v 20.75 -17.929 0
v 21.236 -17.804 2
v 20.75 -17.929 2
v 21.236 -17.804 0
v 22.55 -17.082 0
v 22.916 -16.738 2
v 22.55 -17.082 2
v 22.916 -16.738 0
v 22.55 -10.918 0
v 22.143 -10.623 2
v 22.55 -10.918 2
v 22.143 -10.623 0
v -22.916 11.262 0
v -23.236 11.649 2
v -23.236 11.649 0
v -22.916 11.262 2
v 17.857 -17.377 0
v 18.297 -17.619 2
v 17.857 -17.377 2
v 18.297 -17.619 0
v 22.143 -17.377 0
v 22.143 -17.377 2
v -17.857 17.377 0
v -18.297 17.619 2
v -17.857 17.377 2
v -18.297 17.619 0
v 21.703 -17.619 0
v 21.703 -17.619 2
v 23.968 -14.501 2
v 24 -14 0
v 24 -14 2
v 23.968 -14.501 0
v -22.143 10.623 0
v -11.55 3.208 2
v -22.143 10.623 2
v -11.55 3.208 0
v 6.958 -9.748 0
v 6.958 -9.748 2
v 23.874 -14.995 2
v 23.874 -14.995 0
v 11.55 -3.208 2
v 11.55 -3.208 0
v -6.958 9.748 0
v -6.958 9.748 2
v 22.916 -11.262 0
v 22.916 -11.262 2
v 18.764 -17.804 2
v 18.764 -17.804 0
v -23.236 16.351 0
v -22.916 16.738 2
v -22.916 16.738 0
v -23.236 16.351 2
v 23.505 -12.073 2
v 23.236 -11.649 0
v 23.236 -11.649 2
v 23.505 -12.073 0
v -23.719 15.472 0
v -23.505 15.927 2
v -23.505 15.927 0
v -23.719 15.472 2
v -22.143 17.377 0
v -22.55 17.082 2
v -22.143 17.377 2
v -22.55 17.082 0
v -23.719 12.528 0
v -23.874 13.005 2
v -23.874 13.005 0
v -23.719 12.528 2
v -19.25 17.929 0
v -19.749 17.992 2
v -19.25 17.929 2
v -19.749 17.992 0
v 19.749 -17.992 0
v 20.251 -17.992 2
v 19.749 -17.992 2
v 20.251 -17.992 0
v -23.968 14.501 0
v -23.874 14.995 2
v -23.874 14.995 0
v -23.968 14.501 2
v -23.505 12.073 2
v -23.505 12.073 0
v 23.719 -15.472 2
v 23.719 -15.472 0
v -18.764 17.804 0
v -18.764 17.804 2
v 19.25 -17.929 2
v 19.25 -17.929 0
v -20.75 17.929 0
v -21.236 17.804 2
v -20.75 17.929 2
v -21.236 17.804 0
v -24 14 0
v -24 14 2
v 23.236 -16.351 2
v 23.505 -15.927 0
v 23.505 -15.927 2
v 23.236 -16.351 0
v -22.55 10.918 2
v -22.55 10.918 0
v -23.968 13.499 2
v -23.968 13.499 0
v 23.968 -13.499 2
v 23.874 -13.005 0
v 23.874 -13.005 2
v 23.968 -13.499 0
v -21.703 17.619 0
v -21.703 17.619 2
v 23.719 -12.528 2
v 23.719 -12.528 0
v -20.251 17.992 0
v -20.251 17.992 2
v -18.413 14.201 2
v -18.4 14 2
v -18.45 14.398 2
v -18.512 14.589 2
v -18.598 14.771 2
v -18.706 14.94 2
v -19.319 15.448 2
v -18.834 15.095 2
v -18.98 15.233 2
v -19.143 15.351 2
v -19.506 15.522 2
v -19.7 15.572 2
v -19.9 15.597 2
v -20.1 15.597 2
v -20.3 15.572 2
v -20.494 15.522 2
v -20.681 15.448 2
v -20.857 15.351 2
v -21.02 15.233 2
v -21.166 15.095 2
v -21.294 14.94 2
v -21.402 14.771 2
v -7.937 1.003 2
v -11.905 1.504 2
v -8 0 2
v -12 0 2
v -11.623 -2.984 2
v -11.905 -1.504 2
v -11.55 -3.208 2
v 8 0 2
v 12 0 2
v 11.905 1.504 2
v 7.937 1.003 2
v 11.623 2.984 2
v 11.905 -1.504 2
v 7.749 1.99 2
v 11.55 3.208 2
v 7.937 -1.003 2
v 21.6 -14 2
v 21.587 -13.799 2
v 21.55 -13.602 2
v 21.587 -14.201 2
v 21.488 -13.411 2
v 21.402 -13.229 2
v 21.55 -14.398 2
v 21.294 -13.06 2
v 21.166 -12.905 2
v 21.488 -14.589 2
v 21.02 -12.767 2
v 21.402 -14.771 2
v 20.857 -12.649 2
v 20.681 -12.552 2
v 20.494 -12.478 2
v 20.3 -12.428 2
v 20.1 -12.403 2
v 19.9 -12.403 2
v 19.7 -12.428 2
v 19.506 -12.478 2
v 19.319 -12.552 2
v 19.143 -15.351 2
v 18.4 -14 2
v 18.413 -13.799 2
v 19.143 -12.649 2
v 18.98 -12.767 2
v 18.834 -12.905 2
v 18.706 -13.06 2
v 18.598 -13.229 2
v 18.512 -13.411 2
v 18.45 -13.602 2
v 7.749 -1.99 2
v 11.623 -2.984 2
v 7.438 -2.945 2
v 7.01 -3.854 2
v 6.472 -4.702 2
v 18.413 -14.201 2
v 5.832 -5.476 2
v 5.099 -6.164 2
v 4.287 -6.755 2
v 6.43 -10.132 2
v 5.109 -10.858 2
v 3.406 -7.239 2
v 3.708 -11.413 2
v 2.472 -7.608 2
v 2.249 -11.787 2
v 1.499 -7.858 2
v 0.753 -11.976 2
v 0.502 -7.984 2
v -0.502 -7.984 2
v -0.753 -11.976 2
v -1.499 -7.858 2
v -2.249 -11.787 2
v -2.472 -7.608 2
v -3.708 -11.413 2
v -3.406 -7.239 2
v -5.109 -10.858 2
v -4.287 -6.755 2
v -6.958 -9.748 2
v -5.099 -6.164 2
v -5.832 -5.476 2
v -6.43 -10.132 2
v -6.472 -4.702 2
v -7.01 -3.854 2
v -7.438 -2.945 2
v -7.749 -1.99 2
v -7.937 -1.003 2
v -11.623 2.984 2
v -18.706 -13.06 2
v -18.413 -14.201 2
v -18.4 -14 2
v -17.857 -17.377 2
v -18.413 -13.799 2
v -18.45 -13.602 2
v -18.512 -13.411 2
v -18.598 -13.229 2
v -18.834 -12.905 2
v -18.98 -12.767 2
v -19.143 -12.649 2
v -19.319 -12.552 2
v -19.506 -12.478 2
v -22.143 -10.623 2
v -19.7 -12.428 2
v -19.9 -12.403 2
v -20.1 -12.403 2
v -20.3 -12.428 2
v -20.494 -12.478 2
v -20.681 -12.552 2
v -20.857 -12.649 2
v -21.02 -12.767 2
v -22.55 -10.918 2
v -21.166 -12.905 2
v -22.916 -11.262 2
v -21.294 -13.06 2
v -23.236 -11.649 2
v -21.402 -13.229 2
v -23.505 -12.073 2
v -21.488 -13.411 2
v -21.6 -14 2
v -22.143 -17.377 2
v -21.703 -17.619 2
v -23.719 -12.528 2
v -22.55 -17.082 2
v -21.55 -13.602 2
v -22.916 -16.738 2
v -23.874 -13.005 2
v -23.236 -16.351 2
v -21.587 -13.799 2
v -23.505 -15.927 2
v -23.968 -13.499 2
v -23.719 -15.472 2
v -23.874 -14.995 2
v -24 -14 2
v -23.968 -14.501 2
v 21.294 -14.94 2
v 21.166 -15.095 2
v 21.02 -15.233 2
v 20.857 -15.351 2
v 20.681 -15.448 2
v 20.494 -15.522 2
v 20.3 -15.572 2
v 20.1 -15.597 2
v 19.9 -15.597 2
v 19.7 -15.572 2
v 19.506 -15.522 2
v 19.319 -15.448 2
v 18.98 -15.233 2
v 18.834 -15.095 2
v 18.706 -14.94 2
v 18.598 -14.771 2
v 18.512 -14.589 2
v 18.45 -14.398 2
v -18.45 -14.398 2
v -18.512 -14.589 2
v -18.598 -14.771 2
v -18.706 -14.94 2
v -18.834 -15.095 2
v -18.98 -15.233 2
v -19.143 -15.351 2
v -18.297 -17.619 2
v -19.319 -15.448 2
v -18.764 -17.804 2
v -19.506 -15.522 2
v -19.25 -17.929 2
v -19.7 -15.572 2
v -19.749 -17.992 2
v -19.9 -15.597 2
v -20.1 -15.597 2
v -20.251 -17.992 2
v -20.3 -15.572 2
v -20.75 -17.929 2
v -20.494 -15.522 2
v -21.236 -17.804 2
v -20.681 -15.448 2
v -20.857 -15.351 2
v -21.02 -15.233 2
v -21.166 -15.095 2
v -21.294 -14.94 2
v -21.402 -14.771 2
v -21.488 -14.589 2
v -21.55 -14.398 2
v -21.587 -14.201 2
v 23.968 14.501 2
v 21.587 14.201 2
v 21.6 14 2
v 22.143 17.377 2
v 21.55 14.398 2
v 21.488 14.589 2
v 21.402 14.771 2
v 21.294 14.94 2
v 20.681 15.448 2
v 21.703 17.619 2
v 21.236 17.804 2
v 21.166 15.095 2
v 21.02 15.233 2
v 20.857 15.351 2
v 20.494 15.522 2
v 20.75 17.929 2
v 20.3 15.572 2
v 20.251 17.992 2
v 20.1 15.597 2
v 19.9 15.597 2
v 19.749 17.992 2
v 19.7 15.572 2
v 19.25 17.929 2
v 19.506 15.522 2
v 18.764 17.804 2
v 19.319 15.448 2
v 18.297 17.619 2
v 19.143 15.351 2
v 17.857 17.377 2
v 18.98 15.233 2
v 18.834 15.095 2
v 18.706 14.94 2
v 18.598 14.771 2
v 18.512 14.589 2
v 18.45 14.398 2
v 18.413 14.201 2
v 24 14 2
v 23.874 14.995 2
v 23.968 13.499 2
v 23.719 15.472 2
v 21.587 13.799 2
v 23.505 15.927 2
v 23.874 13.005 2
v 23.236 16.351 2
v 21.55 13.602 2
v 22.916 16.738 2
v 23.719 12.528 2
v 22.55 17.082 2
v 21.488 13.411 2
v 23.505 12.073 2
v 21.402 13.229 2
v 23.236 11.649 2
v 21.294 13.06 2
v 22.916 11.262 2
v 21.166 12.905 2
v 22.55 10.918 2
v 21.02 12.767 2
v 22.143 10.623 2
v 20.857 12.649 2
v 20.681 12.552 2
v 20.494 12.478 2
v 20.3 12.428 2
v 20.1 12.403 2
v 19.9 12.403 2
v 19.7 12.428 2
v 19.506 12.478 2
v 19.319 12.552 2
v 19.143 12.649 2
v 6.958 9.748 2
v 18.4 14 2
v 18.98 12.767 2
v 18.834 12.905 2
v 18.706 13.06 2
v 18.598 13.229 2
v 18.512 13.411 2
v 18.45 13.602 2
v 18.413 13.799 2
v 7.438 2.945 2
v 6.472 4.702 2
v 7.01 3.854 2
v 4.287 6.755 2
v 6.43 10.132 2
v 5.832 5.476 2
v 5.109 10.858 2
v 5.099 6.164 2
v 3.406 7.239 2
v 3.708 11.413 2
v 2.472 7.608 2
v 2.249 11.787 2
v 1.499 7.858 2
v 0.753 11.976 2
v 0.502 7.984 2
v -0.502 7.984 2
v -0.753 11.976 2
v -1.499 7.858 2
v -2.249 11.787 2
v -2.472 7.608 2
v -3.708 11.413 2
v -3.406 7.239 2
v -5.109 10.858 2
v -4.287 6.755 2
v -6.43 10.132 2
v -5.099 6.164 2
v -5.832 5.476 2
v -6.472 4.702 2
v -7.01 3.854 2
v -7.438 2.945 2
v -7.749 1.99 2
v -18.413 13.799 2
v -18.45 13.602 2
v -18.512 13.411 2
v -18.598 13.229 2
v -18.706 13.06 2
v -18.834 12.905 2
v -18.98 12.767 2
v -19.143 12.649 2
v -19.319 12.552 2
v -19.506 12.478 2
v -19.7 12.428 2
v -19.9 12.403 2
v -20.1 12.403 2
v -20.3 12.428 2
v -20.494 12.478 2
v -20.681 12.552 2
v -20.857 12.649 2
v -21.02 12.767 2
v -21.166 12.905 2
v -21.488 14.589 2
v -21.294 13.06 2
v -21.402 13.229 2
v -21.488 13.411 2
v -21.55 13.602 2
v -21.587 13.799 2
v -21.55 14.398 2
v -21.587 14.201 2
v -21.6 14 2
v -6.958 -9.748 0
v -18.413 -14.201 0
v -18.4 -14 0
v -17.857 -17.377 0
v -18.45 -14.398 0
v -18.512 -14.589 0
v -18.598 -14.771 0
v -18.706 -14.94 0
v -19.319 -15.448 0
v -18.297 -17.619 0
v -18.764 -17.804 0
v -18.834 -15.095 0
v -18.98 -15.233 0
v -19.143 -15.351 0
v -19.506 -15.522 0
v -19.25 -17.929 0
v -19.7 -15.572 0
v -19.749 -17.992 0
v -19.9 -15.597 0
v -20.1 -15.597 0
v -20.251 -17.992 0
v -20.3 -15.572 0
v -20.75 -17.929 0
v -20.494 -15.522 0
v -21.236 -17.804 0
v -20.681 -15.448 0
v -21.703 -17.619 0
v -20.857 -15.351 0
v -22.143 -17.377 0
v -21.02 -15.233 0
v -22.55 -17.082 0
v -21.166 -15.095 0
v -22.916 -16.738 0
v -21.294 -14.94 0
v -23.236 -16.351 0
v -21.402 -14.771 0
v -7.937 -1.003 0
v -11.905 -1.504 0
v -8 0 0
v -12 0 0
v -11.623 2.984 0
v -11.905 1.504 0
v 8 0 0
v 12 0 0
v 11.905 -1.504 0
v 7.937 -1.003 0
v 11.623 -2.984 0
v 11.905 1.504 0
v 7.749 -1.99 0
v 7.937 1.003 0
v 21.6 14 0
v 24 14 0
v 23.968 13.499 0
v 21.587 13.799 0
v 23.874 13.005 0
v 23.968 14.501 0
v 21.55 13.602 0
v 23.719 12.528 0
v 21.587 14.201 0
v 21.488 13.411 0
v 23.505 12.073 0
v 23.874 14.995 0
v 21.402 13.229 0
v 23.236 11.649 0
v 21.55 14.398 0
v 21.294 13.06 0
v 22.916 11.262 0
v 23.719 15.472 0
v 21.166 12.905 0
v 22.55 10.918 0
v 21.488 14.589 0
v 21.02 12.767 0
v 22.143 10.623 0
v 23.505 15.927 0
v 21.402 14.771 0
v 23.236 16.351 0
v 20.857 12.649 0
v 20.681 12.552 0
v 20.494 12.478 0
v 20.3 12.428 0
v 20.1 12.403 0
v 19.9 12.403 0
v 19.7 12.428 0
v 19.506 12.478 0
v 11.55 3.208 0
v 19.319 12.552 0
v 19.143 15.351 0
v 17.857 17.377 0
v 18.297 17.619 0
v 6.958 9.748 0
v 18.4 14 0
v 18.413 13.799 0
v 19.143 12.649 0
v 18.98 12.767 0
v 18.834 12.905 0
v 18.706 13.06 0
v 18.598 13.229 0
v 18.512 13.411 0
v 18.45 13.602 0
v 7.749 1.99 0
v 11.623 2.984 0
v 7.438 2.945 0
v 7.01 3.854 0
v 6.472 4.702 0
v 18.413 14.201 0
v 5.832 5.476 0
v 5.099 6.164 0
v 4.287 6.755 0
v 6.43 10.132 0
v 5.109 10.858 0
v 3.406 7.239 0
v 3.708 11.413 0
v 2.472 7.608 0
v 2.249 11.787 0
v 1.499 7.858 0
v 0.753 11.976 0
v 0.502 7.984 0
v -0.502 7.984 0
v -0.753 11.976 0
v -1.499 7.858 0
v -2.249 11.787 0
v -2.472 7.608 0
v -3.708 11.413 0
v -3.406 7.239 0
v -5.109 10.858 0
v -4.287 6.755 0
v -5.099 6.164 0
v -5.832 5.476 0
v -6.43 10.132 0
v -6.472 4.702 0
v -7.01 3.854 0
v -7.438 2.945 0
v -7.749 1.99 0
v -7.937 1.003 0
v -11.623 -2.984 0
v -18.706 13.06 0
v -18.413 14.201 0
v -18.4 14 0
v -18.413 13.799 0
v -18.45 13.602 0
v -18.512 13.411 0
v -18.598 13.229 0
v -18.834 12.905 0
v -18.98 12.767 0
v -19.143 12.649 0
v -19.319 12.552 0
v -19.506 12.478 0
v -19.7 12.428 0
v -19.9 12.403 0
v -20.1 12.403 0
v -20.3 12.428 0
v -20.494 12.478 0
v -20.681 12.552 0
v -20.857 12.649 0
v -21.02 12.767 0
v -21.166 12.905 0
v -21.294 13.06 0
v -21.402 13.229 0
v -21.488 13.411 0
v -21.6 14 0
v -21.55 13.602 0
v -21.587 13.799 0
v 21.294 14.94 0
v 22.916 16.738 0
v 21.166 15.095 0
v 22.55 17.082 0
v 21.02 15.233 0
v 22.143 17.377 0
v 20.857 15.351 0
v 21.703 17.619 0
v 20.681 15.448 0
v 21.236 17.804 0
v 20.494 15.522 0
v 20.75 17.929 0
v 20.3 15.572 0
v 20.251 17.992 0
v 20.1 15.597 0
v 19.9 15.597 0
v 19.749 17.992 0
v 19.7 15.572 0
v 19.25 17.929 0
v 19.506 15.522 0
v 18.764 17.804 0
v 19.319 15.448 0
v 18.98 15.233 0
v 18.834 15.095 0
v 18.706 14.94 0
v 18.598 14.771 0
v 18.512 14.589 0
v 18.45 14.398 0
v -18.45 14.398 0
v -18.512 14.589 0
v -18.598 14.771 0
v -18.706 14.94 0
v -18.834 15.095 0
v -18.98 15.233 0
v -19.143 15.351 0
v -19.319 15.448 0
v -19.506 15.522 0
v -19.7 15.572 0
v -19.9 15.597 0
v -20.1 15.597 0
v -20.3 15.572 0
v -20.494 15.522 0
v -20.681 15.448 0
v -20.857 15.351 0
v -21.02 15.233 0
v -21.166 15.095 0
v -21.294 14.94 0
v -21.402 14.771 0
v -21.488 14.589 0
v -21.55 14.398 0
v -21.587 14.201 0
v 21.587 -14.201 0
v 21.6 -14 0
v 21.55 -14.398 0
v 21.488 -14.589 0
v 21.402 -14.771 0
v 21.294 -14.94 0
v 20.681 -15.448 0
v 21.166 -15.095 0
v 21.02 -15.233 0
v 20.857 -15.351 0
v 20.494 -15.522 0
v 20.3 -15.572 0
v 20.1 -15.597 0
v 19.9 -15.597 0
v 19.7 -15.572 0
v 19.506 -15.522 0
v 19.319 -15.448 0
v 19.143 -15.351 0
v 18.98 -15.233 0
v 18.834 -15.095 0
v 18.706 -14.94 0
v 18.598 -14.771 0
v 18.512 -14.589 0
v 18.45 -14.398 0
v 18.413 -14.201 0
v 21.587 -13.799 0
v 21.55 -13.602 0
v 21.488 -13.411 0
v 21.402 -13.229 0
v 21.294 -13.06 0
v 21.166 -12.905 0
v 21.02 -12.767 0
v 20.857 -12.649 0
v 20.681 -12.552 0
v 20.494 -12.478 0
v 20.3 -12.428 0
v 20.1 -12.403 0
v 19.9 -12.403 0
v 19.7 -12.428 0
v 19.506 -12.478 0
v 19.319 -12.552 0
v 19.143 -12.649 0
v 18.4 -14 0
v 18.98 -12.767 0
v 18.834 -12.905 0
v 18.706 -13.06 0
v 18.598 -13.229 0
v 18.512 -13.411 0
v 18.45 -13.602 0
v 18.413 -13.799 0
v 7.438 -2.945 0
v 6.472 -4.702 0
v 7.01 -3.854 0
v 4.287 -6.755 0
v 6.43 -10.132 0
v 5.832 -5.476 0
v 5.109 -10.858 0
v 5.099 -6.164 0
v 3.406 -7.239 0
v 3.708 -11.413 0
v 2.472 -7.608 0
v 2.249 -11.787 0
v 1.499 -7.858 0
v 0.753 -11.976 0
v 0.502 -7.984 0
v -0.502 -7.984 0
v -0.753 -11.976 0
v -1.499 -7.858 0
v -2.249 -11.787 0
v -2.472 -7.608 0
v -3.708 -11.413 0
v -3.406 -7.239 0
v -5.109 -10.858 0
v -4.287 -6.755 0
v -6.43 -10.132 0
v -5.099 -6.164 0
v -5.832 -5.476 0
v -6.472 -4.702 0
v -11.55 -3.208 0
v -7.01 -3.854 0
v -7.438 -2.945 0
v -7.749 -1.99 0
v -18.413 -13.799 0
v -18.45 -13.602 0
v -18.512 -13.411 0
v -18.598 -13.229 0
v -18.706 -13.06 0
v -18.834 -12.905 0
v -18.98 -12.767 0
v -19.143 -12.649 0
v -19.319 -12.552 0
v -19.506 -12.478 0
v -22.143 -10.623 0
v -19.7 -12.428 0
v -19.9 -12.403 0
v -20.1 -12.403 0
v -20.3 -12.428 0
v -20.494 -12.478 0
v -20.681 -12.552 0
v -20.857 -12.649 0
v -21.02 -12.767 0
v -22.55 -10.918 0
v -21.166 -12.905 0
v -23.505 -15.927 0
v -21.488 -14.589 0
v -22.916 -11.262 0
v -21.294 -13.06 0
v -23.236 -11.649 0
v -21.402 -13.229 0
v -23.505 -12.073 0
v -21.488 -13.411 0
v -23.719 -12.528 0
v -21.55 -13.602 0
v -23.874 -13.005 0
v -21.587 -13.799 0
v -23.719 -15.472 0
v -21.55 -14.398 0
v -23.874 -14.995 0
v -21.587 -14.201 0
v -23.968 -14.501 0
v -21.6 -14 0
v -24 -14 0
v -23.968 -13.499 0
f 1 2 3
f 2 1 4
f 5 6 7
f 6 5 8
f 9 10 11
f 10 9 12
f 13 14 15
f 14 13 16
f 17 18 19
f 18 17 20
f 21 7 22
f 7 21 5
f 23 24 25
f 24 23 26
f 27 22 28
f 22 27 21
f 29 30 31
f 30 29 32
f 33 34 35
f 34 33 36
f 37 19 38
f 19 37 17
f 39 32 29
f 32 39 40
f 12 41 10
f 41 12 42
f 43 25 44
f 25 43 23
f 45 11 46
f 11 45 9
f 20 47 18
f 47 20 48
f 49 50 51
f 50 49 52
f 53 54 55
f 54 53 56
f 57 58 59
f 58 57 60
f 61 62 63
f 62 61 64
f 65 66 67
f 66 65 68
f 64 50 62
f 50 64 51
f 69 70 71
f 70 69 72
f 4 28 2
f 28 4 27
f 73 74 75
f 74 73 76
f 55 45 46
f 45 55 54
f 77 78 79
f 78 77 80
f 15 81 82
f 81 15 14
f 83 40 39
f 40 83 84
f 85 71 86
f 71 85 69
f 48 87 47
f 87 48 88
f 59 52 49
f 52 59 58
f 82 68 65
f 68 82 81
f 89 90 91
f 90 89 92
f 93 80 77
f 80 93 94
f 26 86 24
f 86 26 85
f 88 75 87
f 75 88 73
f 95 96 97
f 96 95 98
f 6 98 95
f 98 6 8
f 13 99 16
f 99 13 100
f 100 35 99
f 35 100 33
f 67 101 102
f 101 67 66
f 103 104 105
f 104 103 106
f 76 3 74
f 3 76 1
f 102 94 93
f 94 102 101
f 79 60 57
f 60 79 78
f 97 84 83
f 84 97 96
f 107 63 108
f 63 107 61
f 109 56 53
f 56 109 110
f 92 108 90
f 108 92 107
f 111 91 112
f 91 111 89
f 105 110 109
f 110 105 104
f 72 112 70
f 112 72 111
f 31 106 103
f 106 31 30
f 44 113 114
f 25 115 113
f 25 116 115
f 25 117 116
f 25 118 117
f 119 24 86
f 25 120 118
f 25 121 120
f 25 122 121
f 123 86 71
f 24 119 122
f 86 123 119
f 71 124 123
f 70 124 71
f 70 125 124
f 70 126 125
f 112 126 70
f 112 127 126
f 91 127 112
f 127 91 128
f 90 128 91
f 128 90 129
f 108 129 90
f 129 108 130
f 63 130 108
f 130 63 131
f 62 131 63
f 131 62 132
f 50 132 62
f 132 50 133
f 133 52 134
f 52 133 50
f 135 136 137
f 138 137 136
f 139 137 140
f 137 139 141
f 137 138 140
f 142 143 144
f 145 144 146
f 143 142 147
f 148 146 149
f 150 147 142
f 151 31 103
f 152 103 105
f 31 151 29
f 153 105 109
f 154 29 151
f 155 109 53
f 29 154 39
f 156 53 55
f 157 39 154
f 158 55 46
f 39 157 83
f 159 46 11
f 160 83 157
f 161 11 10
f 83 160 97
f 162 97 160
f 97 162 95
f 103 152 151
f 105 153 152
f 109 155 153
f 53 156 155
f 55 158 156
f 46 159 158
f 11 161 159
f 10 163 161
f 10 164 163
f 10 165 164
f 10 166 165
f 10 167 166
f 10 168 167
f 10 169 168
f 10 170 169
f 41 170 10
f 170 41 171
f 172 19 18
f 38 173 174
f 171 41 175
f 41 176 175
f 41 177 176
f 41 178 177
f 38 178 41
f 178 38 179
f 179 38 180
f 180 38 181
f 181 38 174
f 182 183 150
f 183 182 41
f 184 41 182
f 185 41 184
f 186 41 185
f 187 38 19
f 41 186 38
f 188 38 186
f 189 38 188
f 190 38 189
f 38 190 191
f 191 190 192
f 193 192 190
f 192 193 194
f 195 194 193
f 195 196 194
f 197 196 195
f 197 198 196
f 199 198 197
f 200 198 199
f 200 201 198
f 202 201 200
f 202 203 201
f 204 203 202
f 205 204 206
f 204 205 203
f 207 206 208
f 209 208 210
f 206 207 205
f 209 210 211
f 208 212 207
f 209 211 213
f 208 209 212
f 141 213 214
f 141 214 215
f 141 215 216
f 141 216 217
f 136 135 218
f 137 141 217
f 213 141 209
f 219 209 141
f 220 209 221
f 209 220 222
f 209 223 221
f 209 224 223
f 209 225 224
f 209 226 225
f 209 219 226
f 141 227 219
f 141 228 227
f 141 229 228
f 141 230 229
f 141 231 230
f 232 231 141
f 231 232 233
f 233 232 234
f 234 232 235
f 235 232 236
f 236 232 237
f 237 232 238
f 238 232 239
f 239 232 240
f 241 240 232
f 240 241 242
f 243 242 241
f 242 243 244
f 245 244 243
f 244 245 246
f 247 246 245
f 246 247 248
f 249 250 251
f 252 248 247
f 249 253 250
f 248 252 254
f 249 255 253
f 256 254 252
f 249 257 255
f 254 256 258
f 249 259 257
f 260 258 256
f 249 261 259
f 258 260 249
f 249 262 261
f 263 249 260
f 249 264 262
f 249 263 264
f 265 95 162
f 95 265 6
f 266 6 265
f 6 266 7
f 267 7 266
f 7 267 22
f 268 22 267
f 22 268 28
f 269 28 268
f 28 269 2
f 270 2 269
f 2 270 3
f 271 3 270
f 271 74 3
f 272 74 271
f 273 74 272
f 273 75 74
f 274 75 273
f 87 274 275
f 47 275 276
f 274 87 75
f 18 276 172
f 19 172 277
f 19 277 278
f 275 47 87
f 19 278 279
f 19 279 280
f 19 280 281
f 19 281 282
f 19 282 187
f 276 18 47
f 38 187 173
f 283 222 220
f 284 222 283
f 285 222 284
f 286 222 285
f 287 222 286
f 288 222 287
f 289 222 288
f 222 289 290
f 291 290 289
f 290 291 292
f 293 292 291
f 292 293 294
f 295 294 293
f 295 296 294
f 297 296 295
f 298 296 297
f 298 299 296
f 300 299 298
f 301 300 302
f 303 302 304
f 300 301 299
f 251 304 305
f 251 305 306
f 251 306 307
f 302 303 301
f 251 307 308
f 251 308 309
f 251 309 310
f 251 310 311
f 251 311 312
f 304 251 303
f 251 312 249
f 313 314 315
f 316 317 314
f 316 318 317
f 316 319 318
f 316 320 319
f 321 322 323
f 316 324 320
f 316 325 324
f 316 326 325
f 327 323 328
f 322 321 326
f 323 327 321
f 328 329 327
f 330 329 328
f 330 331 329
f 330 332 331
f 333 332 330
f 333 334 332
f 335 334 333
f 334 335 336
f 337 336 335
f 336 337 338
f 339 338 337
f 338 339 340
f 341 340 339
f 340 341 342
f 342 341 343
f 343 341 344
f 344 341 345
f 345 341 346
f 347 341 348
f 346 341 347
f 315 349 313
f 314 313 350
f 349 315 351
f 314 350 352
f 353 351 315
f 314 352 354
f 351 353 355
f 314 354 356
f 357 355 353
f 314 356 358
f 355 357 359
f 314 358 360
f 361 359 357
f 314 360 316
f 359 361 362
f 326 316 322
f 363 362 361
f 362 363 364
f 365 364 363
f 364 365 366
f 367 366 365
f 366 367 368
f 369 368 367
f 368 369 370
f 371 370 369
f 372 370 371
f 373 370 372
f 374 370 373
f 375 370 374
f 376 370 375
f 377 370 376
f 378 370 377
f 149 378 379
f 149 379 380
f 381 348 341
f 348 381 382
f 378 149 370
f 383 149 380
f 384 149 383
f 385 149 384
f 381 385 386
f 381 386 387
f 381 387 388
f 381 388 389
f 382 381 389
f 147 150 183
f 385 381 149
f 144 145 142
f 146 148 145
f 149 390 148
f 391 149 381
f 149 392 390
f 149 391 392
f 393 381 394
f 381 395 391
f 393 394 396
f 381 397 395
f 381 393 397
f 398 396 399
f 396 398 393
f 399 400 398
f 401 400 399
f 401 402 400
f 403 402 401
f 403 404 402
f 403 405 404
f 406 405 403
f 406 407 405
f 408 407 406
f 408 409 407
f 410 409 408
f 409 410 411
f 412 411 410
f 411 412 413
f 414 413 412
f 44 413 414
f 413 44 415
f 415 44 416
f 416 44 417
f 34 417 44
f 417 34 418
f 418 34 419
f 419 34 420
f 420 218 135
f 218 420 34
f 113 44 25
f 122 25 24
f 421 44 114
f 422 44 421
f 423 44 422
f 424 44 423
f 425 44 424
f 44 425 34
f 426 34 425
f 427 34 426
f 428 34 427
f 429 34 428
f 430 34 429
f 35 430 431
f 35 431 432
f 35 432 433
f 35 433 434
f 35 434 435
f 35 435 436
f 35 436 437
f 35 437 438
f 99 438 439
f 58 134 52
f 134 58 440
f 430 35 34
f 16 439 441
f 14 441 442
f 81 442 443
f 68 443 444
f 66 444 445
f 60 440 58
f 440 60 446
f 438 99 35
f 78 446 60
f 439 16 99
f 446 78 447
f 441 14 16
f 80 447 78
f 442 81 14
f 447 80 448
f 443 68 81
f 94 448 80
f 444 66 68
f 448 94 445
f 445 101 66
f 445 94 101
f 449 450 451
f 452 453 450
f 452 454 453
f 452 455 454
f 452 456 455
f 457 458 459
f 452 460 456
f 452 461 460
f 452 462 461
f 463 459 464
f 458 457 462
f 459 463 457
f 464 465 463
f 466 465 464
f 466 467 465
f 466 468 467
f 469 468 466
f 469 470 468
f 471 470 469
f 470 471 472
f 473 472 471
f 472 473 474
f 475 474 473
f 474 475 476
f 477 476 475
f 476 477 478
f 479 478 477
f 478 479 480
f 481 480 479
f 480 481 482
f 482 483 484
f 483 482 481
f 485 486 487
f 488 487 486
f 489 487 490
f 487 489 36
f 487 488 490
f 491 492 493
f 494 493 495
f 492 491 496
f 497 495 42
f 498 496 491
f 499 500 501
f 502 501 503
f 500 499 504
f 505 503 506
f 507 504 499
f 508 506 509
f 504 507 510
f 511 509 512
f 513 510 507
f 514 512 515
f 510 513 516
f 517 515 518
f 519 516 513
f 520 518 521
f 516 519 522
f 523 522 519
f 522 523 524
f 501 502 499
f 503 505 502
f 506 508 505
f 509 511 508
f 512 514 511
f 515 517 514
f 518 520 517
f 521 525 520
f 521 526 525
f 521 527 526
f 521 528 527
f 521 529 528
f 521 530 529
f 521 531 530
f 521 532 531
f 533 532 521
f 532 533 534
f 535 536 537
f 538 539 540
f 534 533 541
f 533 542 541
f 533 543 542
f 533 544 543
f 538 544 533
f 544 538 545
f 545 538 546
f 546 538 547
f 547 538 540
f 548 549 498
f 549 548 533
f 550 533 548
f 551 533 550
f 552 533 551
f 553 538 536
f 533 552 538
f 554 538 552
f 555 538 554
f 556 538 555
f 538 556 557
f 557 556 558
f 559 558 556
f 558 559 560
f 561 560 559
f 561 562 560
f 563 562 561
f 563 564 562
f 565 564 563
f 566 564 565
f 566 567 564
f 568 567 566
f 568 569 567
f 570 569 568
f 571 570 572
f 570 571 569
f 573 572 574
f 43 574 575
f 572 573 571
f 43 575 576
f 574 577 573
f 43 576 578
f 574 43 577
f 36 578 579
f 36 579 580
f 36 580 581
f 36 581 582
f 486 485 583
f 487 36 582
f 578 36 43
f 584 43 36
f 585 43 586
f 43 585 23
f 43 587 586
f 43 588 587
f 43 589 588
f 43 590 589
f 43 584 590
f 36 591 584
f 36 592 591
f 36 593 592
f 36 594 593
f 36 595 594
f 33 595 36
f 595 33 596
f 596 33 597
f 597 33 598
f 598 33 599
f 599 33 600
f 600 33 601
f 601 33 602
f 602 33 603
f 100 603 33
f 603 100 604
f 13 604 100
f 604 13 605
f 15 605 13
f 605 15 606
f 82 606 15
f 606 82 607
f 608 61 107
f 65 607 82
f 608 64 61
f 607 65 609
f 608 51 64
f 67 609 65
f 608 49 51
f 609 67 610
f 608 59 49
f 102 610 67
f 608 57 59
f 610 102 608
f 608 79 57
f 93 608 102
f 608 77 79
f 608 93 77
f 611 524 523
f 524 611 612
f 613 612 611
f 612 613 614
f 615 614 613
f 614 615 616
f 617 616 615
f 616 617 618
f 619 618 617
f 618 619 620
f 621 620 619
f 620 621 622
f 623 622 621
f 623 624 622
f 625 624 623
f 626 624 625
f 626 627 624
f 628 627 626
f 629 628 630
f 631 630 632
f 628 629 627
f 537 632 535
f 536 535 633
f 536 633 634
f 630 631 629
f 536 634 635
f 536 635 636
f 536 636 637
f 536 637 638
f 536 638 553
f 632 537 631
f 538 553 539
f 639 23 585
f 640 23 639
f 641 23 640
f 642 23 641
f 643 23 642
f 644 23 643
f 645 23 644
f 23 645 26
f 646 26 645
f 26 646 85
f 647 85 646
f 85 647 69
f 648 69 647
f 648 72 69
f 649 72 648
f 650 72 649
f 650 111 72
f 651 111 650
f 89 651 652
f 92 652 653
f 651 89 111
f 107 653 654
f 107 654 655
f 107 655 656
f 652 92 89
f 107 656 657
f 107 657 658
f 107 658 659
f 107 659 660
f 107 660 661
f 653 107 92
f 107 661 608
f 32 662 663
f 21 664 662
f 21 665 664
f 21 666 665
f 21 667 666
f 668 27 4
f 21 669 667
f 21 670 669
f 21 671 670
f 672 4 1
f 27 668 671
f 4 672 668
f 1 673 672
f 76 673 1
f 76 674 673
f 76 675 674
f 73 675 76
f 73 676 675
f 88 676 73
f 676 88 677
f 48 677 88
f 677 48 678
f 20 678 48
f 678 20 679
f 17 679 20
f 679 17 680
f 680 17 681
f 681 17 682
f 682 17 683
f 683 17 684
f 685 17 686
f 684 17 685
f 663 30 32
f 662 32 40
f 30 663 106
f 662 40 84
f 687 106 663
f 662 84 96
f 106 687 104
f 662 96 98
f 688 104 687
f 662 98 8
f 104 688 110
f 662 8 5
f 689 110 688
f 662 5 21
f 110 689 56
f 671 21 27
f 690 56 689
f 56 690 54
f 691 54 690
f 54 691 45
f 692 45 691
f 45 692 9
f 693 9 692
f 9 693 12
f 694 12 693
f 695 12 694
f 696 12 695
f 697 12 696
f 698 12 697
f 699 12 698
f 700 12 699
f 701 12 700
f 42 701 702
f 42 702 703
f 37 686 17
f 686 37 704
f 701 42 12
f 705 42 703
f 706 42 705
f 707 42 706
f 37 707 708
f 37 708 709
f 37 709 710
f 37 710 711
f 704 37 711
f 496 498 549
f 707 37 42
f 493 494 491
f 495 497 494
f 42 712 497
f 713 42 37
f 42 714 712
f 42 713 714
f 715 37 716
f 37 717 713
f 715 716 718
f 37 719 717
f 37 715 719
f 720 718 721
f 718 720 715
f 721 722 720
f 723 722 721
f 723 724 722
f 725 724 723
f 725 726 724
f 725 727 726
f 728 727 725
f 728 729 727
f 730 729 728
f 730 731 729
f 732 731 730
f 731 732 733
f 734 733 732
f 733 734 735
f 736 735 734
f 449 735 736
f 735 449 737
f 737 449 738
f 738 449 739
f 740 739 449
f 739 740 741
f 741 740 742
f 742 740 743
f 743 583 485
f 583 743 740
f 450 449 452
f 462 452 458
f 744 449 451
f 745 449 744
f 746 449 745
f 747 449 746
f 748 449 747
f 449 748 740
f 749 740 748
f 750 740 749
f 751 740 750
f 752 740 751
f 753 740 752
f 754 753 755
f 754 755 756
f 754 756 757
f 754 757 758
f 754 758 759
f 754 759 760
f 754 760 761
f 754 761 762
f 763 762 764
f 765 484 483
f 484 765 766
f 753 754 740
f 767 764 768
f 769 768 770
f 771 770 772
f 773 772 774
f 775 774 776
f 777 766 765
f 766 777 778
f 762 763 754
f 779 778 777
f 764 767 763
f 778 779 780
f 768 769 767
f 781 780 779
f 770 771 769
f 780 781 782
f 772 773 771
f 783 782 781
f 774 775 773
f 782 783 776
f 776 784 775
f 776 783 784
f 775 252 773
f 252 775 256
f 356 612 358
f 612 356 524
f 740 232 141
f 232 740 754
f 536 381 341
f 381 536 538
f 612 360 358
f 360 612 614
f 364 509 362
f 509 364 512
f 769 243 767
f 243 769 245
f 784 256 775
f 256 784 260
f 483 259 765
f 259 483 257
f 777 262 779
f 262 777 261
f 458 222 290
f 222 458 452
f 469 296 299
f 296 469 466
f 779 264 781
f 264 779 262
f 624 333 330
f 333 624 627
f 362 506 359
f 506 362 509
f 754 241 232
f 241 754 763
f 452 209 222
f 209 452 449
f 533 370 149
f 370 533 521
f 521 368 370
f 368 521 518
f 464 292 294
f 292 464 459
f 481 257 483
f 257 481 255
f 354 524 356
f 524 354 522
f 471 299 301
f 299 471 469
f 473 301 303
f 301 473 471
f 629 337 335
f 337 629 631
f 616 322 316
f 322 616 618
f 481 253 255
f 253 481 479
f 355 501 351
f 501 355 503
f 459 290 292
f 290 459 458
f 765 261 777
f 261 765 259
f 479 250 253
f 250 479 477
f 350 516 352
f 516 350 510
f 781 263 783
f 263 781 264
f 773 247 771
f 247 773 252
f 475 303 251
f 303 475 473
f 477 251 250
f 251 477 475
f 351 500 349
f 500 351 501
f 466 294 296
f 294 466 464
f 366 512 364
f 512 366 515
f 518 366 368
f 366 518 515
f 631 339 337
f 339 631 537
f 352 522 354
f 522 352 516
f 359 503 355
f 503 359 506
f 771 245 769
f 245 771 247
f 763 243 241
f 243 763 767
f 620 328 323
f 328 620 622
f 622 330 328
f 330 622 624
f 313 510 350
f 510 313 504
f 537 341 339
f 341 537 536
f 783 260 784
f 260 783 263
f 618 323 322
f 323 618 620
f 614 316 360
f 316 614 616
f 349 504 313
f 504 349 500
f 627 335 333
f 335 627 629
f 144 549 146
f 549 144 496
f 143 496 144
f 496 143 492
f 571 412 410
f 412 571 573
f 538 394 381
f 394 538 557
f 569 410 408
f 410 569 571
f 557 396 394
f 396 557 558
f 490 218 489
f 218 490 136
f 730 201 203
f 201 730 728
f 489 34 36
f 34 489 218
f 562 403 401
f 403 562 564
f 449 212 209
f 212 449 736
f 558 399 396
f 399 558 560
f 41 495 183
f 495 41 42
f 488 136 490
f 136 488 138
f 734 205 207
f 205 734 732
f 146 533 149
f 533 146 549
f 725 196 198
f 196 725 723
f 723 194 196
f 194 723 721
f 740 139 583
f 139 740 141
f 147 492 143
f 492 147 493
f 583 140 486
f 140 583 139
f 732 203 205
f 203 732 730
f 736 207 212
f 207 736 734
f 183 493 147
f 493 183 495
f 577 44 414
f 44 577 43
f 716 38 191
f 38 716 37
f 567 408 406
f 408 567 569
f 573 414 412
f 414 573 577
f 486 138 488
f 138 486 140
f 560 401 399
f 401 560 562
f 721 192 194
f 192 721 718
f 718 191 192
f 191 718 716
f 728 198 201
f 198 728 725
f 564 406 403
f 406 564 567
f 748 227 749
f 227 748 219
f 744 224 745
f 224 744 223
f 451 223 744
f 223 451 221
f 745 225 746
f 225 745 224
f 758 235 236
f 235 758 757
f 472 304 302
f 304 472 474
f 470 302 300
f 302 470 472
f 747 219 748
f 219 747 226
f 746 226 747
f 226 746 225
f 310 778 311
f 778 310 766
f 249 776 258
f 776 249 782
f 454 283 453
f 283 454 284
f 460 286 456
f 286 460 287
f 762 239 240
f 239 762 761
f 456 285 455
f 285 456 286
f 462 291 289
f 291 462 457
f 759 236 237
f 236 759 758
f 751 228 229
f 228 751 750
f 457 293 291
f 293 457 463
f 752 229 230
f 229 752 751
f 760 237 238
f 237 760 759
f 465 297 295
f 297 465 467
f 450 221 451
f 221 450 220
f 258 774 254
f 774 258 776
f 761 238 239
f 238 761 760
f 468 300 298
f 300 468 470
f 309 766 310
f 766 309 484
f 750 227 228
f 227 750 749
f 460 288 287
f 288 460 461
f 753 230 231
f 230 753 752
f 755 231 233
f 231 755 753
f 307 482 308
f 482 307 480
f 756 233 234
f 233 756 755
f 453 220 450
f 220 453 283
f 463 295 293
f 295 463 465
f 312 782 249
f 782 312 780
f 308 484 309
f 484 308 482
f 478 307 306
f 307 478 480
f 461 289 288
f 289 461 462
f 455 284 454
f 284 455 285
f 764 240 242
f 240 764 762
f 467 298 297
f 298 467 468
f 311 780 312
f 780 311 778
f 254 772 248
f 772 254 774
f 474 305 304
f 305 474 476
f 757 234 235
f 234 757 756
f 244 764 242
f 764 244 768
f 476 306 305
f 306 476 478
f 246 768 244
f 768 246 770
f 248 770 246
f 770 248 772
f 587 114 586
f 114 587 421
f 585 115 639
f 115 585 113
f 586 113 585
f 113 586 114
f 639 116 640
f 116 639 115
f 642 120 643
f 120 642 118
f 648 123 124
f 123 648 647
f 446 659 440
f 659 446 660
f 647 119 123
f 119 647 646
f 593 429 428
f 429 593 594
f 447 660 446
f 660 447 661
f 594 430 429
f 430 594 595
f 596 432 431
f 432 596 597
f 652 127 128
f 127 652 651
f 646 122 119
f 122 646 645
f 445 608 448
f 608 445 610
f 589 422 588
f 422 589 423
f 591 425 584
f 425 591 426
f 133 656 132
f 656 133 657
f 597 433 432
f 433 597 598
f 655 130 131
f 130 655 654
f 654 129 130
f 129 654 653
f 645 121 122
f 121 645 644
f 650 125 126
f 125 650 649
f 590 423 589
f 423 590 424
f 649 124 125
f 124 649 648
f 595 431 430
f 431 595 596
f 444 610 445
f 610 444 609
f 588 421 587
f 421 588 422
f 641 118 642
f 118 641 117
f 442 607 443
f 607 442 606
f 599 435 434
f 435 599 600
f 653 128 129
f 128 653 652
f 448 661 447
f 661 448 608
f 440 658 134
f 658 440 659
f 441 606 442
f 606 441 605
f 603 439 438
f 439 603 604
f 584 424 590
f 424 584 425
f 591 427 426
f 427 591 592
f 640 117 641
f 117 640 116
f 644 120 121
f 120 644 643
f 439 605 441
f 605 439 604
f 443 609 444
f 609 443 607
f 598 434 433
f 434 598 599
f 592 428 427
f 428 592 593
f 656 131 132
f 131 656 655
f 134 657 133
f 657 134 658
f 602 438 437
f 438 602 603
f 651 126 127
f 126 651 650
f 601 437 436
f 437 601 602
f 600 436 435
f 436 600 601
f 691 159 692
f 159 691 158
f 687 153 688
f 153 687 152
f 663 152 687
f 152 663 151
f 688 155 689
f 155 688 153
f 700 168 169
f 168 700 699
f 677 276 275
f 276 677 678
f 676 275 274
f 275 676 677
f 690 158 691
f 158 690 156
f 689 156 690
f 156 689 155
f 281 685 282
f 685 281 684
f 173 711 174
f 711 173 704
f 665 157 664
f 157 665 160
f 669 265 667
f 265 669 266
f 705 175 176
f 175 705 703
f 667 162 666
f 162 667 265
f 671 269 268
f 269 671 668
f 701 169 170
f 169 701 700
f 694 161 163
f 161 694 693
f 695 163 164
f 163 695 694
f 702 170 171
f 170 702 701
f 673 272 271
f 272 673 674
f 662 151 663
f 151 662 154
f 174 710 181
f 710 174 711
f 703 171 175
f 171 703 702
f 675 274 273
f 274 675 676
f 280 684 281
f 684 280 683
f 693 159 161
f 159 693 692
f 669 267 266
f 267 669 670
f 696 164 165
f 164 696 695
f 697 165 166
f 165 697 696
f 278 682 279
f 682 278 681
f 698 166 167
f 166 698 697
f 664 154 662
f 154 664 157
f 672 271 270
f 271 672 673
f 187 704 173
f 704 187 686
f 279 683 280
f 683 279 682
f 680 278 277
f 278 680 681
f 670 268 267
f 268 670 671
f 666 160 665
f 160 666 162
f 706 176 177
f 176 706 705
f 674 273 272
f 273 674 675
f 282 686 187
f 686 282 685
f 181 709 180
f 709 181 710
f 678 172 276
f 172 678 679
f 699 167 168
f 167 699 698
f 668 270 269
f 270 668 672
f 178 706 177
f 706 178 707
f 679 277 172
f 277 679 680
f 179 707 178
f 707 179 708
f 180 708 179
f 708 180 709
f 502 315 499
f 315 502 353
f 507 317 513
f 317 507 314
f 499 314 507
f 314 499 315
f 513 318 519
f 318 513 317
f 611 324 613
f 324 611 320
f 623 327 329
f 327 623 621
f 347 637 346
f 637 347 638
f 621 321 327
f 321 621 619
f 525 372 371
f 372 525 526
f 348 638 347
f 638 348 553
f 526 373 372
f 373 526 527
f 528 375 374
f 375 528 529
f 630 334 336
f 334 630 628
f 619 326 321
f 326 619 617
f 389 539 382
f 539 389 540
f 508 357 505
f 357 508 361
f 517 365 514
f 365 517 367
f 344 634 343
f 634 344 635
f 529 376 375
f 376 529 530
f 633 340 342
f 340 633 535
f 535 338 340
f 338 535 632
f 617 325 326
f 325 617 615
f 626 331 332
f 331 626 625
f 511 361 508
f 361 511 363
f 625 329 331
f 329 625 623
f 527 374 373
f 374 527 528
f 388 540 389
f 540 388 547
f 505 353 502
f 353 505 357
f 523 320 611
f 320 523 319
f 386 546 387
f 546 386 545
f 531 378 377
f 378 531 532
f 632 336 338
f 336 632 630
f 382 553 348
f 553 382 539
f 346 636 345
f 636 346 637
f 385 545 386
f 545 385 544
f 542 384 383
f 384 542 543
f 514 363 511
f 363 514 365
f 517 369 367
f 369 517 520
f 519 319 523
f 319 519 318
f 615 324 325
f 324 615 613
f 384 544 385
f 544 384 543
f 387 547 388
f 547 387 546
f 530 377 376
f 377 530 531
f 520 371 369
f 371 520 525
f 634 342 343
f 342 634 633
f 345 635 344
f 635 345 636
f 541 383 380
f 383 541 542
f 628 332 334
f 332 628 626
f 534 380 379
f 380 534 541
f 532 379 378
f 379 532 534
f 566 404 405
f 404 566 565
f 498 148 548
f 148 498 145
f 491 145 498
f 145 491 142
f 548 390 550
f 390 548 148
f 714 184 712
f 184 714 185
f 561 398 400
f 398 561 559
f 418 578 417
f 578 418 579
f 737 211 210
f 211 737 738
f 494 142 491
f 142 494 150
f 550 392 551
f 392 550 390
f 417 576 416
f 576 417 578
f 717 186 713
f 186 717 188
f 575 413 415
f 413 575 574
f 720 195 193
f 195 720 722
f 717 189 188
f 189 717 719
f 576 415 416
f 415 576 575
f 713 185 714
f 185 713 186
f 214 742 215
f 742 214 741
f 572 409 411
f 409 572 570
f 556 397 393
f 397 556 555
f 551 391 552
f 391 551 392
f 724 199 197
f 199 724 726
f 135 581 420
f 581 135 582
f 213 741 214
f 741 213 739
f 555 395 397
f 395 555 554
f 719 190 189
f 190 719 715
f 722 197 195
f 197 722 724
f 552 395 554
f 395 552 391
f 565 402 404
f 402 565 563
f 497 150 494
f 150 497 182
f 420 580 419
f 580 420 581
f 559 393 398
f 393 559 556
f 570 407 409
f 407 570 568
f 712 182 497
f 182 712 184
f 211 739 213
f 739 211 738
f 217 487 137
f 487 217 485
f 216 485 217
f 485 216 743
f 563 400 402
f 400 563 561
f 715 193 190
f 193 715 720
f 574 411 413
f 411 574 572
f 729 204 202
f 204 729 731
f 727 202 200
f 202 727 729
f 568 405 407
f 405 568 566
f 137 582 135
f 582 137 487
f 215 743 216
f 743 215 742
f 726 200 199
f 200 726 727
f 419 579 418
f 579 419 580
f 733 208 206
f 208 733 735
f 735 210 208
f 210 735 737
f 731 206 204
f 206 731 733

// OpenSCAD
x1=20;
y1=14;
r1=4;
r2=1.6;
z=2;

fn=50;

module v1() {
    difference() {
        hull() {
            for(i=[-1,1]){
                for(j=[-1,1]){
                    translate([i*x1, j*y1, 0]) cylinder(r=r1,h=z, $fn=fn);
                }
            }
        }
        
        for(i=[-1,1]){
            for(j=[-1,1]){
                translate([i*x1, j*y1, 0]) cylinder(r=r2,h=z, $fn=fn);
            }
            translate([i*30, 0, 0]) cylinder(r=8,h=z, $fn=fn);
        }
        
        cylinder(r=8,h=z, $fn=fn);
    }
}

module v2() {
    difference() {
    union() {
        for(i=[-1,1]){
            hull() {
                translate([x1, i*y1, 0]) cylinder(r=r1,h=z, $fn=fn);
                translate([-x1, -i*y1, 0]) cylinder(r=r1,h=z, $fn=fn);
            }
        }
        cylinder(r=12,h=z, $fn=fn);
    }
    
    for(i=[-1,1]){
        for(j=[-1,1]){
            translate([i*x1, j*y1, 0]) cylinder(r=r2,h=z, $fn=fn);
        }
    }
    
    cylinder(r=8,h=z, $fn=fn);
    }
}

v2();
